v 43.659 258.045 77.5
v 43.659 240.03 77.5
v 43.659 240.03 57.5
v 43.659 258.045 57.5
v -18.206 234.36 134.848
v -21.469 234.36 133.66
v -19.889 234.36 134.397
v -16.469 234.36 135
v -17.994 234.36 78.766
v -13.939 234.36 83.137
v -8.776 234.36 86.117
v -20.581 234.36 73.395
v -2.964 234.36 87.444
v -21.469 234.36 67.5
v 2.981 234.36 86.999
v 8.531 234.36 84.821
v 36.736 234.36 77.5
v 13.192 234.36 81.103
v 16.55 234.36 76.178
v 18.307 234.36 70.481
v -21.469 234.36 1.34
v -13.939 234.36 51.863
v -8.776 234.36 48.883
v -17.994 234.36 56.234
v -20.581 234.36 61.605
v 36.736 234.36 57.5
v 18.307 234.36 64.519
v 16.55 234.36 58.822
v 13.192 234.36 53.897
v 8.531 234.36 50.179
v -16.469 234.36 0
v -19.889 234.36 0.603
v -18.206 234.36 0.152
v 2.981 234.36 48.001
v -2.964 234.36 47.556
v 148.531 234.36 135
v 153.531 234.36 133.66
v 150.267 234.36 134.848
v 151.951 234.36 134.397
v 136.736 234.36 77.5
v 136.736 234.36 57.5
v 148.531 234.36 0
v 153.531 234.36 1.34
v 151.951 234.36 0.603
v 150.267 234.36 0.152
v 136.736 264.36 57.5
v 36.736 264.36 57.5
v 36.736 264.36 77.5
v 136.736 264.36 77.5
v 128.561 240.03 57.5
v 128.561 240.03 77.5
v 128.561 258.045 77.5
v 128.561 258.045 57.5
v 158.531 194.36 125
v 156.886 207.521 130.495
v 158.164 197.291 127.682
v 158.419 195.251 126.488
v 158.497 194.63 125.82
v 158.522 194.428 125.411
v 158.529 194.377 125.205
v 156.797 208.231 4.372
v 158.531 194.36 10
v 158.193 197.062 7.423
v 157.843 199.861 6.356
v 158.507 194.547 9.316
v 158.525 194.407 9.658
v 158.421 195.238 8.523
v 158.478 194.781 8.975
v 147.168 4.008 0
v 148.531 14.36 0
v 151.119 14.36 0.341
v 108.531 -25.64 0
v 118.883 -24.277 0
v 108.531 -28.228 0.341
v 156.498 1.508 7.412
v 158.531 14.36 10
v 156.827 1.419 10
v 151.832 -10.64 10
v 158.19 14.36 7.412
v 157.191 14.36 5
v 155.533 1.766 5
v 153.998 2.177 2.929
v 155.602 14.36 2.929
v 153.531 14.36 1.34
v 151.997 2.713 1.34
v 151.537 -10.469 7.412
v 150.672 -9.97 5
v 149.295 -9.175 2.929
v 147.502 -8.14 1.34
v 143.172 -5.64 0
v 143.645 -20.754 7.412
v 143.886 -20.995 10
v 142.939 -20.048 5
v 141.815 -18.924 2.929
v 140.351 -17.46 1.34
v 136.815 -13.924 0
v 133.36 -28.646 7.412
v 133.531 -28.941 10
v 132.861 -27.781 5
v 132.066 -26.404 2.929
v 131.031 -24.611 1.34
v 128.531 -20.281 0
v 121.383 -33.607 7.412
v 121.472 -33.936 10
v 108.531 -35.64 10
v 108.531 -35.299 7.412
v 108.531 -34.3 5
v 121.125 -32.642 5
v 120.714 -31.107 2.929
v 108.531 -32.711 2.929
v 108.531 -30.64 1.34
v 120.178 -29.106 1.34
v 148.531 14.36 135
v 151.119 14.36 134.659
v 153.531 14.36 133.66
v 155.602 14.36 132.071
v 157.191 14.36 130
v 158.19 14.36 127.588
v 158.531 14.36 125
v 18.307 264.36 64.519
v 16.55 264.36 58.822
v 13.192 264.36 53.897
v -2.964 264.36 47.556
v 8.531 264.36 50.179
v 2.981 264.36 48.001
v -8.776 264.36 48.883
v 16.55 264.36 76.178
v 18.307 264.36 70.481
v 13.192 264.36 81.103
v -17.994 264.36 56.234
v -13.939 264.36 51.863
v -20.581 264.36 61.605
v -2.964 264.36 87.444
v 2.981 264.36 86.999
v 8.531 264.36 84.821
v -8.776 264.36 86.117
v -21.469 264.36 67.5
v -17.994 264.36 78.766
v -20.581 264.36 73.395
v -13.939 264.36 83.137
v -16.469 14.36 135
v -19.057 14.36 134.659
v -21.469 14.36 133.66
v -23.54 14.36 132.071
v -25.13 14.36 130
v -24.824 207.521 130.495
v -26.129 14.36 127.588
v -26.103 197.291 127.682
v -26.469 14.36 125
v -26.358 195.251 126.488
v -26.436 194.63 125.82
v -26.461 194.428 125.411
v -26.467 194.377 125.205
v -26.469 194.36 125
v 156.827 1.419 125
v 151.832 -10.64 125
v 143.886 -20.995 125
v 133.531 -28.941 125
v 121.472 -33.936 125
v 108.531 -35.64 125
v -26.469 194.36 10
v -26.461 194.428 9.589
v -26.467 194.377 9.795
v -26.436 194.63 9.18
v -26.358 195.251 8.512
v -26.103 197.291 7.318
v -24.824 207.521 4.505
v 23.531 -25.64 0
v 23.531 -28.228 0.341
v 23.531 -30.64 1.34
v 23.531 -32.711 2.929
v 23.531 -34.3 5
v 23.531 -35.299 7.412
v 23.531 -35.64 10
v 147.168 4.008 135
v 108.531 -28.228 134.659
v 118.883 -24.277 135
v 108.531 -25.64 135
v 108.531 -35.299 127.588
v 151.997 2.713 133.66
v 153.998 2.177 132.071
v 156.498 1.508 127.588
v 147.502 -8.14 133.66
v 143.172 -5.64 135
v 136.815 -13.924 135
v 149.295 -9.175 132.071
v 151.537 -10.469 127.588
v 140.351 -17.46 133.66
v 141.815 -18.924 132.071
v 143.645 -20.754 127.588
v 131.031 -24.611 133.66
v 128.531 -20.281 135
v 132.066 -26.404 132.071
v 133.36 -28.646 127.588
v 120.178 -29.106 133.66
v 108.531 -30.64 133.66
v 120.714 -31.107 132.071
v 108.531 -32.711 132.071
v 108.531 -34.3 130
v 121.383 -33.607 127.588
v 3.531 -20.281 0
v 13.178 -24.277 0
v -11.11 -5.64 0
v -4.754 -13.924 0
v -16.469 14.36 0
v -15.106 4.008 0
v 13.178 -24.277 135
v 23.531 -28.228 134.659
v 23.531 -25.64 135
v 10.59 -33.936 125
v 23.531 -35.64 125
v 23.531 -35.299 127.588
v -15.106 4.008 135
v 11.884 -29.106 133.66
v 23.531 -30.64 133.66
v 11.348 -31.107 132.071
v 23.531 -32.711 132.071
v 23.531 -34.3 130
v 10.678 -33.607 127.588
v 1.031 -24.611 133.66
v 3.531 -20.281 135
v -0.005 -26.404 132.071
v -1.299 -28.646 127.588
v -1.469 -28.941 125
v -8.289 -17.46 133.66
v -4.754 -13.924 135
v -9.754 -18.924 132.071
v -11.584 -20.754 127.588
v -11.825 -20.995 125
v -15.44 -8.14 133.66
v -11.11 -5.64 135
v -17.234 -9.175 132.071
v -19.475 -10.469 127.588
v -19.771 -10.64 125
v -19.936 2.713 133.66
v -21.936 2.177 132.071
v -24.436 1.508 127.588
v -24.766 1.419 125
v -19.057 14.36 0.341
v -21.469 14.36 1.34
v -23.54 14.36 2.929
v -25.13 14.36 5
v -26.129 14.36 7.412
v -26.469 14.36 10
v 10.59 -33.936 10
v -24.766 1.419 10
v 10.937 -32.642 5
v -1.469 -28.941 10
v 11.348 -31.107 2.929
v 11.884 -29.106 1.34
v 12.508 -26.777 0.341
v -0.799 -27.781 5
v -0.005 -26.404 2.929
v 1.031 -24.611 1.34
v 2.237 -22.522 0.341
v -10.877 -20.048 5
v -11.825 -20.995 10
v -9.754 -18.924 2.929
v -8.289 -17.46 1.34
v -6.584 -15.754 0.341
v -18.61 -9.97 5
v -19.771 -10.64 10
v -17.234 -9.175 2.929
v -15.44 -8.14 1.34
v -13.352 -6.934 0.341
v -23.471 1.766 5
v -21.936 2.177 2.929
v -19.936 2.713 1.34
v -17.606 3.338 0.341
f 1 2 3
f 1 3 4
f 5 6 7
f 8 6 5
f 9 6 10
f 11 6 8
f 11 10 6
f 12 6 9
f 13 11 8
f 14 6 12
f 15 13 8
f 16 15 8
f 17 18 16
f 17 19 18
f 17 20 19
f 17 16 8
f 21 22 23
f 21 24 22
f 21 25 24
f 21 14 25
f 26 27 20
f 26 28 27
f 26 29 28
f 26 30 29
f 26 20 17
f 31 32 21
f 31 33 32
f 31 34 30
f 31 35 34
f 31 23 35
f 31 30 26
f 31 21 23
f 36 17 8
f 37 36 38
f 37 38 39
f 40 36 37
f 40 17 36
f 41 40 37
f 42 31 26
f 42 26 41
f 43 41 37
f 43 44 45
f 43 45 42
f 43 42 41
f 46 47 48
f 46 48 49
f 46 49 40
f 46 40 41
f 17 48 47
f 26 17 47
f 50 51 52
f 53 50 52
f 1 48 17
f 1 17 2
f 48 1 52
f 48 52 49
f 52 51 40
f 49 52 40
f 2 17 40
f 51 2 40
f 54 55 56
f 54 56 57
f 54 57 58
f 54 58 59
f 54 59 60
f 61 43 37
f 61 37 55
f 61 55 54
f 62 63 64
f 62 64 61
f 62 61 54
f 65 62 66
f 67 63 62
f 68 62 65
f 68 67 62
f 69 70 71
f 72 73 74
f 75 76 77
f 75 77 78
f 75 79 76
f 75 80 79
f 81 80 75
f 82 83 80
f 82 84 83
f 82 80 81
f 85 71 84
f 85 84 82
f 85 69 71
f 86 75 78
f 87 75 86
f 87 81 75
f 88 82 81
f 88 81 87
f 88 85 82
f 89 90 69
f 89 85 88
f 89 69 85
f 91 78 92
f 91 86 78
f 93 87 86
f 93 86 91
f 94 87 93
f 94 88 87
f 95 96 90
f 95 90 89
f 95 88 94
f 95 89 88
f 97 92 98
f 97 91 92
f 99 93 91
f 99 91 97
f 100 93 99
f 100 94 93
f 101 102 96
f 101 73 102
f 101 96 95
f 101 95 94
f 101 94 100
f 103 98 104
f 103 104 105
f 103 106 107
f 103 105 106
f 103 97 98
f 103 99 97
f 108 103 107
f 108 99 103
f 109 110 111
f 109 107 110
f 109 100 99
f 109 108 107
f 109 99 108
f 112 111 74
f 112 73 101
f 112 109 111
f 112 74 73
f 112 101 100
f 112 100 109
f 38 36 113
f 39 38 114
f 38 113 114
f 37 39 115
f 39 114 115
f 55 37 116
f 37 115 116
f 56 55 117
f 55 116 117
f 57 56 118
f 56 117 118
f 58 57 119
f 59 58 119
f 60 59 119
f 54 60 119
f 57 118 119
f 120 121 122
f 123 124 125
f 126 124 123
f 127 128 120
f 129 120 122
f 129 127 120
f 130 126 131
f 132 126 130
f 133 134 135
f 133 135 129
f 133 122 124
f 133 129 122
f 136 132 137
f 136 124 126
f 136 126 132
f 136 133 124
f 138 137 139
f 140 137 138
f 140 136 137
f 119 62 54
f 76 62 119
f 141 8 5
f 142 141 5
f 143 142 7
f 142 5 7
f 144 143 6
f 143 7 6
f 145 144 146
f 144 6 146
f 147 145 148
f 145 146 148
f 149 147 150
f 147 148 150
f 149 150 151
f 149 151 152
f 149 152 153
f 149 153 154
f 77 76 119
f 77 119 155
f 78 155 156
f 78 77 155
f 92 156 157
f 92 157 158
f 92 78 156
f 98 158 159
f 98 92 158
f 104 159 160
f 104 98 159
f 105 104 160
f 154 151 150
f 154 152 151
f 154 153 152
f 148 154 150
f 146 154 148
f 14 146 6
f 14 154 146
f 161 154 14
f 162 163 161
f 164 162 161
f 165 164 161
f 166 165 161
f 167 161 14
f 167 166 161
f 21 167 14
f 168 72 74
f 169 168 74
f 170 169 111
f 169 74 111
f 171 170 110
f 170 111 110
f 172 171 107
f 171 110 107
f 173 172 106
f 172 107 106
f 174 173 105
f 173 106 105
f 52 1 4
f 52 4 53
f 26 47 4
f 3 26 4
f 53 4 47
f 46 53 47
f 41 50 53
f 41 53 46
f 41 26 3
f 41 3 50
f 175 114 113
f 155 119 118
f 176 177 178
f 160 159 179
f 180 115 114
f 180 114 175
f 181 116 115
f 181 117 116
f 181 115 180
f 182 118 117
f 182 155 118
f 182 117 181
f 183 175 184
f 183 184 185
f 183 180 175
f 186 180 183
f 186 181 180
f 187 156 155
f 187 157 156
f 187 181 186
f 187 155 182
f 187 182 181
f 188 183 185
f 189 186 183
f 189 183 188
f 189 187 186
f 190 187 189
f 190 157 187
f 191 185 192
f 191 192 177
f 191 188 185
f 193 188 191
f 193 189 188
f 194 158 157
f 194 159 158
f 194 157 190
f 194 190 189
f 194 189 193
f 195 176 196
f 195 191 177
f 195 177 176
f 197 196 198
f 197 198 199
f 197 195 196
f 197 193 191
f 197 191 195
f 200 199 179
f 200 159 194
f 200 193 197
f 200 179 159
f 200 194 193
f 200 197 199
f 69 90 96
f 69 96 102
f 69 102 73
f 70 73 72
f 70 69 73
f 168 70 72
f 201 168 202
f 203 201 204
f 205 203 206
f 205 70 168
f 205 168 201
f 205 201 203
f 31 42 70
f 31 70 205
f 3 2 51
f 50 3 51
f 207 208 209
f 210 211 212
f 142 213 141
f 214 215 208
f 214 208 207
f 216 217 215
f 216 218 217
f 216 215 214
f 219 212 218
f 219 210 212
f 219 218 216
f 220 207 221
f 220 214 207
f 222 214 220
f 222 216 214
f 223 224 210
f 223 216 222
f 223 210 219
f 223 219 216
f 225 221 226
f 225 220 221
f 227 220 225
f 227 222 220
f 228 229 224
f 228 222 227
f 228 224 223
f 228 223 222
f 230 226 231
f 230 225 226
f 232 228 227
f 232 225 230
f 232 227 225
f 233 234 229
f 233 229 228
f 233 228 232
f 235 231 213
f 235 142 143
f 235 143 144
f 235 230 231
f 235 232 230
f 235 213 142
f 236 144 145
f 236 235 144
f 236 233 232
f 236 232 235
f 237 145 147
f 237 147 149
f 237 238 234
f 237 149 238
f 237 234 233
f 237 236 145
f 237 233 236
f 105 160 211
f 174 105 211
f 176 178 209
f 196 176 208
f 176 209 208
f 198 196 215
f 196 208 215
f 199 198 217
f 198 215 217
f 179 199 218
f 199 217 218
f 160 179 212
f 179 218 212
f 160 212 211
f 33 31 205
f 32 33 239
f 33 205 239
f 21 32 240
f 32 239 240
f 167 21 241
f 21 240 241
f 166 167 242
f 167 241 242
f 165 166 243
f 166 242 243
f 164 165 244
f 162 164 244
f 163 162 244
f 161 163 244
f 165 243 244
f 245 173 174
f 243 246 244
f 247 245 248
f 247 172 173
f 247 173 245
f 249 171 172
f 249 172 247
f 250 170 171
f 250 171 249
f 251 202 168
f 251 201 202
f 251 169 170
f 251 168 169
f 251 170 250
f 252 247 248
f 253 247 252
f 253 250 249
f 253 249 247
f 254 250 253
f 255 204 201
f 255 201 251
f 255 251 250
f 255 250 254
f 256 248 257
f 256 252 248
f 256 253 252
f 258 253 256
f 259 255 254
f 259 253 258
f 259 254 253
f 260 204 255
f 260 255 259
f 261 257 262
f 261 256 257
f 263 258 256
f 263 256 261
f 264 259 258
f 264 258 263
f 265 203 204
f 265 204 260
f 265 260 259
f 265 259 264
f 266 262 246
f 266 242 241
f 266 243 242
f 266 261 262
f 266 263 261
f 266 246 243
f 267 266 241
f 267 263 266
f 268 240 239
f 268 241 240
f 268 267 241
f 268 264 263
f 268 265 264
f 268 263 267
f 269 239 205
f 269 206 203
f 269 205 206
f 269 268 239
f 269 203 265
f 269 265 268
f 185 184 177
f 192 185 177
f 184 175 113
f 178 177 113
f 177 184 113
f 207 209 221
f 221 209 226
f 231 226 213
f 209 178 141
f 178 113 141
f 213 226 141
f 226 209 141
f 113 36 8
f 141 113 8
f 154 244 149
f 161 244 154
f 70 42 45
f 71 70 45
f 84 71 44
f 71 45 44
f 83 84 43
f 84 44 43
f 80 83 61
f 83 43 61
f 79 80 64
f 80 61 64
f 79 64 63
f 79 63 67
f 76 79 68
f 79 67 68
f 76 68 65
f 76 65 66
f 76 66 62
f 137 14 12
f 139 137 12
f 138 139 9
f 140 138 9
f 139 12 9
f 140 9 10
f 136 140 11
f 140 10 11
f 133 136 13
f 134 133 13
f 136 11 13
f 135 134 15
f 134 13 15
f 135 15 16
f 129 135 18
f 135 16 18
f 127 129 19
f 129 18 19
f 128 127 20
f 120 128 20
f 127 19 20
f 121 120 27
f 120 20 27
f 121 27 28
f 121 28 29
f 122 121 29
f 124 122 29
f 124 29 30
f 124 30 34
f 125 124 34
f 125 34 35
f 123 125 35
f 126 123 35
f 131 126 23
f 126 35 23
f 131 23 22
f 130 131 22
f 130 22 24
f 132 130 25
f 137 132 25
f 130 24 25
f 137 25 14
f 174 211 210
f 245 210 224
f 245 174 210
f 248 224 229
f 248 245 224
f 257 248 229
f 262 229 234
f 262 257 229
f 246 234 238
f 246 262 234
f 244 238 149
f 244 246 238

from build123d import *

# Parameters (mm, degrees)
BOSS_EXTRUDE2_DEPTH = 135
SKETCH2_R           = 20
SKETCH2_W           = 100
SKETCH2_H           = 20
BOSS_EXTRUDE3_DEPTH = 30
SKETCH3_W           = 84.902161113
SKETCH3_H           = 18.014954353
CUT_EXTRUDE1_DEPTH  = 30
FILLET1_R           = 10
FILLET2_R           = 10


with BuildPart() as part:
    # Sketch1 → Boss-Extrude2 (new body)
    with BuildSketch(Plane.XY):
        with BuildLine():
            Line((-21.469266172, 234.360279406), (153.530733828, 234.360279406))
            Line((153.530733828, 234.360279406), (158.530733828, 194.360279406))
            Line((158.530733828, 194.360279406), (158.530733828, 14.360279406))
            ThreePointArc((158.530733828, 14.360279406), (143.886072887, -20.995059653), (108.530733828, -35.639720594))
            Line((108.530733828, -35.639720594), (23.530733828, -35.639720594))
            ThreePointArc((23.530733828, -35.639720594), (-11.824605232, -20.995059653), (-26.469266172, 14.360279406))
            Line((-26.469266172, 14.360279406), (-26.469266172, 194.360279406))
            Line((-26.469266172, 194.360279406), (-21.469266172, 234.360279406))
        make_face()
    extrude(amount=BOSS_EXTRUDE2_DEPTH)

    # Sketch2 → Boss-Extrude3 (add)
    with BuildSketch(Plane(origin=(0, 234.360279406, 0), x_dir=(1, 0, 0), z_dir=(0, 1, 0))):
        with Locations(Location((-1.469266172, -67.5, 0), (0, 0, 180))):
            Circle(SKETCH2_R)
        with Locations((86.735726722, -67.5)):
            Rectangle(SKETCH2_W, SKETCH2_H)
    extrude(amount=BOSS_EXTRUDE3_DEPTH)

    # Sketch3 → Cut-Extrude1 (cut)
    with BuildSketch(Plane.XY.offset(77.5)):
        with Locations((86.110215993, 249.037763676)):
            Rectangle(SKETCH3_W, SKETCH3_H)
    extrude(amount=-CUT_EXTRUDE1_DEPTH, mode=Mode.SUBTRACT)

    # Fillet1
    fillet1_edges = [part.edges().sort_by_distance(p)[0] for p in [
        (158.530733828, 104.360279406, 135),
        (143.886072887, -20.995059653, 135),
        (66.030733828, -35.639720594, 135),
        (-11.824605232, -20.995059653, 135),
        (-26.469266172, 104.360279406, 135),
    ]]
    fillet(fillet1_edges, radius=FILLET1_R)

    # Fillet2
    # the kernel refuses this fillet: 10 mm, written as the material it takes off along each edge
    with BuildSketch(Plane(origin=(-26.469266172, 14.360279406, 0), x_dir=(0, 0, 1), z_dir=(0, 1, 0))) as fillet2_piece_1:
        with BuildLine():
            CenterArc((FILLET2_R, FILLET2_R), FILLET2_R, 180, 90)
            Line((0, FILLET2_R), (-FILLET2_R * 0.02, FILLET2_R))
            Line((-FILLET2_R * 0.02, FILLET2_R), (-FILLET2_R * 0.02, -FILLET2_R * 0.02))
            Line((-FILLET2_R * 0.02, -FILLET2_R * 0.02), (FILLET2_R, -FILLET2_R * 0.02))
            Line((FILLET2_R, -FILLET2_R * 0.02), (FILLET2_R, 0))
        make_face()
    extrude(amount=240, mode=Mode.SUBTRACT)
    with BuildSketch(Plane(origin=(23.530733828, 14.360279406, 0), x_dir=(0, -1, 0), z_dir=(1, 0, 0))) as fillet2_piece_2:
        with BuildLine():
            CenterArc((50 - FILLET2_R, -FILLET2_R), FILLET2_R, 0, 90)
            Line((50 - FILLET2_R, 0), (50 - FILLET2_R, FILLET2_R * 0.02))
            Line((50 - FILLET2_R, FILLET2_R * 0.02), (50 + FILLET2_R * 0.02, FILLET2_R * 0.02))
            Line((50 + FILLET2_R * 0.02, FILLET2_R * 0.02), (50 + FILLET2_R * 0.02, -FILLET2_R))
            Line((50 + FILLET2_R * 0.02, -FILLET2_R), (50, -FILLET2_R))
        make_face()
    revolve(axis=Axis((23.530733828, 14.360279406, 0), (0, 0, -1)), revolution_arc=90, mode=Mode.SUBTRACT)
    with BuildSketch(Plane(origin=(108.530733828, -35.639720594, 0), x_dir=(0, 1, 0), z_dir=(-1, 0, 0))) as fillet2_piece_3:
        with BuildLine():
            CenterArc((FILLET2_R, -FILLET2_R), FILLET2_R, 90, 90)
            Line((0, -FILLET2_R), (-FILLET2_R * 0.02, -FILLET2_R))
            Line((-FILLET2_R * 0.02, -FILLET2_R), (-FILLET2_R * 0.02, FILLET2_R * 0.02))
            Line((-FILLET2_R * 0.02, FILLET2_R * 0.02), (FILLET2_R, FILLET2_R * 0.02))
            Line((FILLET2_R, FILLET2_R * 0.02), (FILLET2_R, 0))
        make_face()
    extrude(amount=85, mode=Mode.SUBTRACT)
    with BuildSketch(Plane(origin=(108.530733828, 14.360279406, 0), x_dir=(1, 0, 0), z_dir=(0, 1, 0))) as fillet2_piece_4:
        with BuildLine():
            CenterArc((50 - FILLET2_R, -FILLET2_R), FILLET2_R, 0, 90)
            Line((50, -FILLET2_R), (50 + FILLET2_R * 0.02, -FILLET2_R))
            Line((50 + FILLET2_R * 0.02, -FILLET2_R), (50 + FILLET2_R * 0.02, FILLET2_R * 0.02))
            Line((50 + FILLET2_R * 0.02, FILLET2_R * 0.02), (50 - FILLET2_R, FILLET2_R * 0.02))
            Line((50 - FILLET2_R, FILLET2_R * 0.02), (50 - FILLET2_R, 0))
        make_face()
    revolve(axis=Axis((108.530733828, 14.360279406, 0), (0, 0, -1)), revolution_arc=90, mode=Mode.SUBTRACT)
    with BuildSketch(Plane(origin=(158.530733828, 254.360279406, 0), x_dir=(-1, 0, 0), z_dir=(0, -1, 0))) as fillet2_piece_5:
        with BuildLine():
            CenterArc((FILLET2_R, -FILLET2_R), FILLET2_R, 90, 90)
            Line((0, -FILLET2_R), (-FILLET2_R * 0.02, -FILLET2_R))
            Line((-FILLET2_R * 0.02, -FILLET2_R), (-FILLET2_R * 0.02, FILLET2_R * 0.02))
            Line((-FILLET2_R * 0.02, FILLET2_R * 0.02), (FILLET2_R, FILLET2_R * 0.02))
            Line((FILLET2_R, FILLET2_R * 0.02), (FILLET2_R, 0))
        make_face()
    extrude(amount=240, mode=Mode.SUBTRACT)


solid = part.part
